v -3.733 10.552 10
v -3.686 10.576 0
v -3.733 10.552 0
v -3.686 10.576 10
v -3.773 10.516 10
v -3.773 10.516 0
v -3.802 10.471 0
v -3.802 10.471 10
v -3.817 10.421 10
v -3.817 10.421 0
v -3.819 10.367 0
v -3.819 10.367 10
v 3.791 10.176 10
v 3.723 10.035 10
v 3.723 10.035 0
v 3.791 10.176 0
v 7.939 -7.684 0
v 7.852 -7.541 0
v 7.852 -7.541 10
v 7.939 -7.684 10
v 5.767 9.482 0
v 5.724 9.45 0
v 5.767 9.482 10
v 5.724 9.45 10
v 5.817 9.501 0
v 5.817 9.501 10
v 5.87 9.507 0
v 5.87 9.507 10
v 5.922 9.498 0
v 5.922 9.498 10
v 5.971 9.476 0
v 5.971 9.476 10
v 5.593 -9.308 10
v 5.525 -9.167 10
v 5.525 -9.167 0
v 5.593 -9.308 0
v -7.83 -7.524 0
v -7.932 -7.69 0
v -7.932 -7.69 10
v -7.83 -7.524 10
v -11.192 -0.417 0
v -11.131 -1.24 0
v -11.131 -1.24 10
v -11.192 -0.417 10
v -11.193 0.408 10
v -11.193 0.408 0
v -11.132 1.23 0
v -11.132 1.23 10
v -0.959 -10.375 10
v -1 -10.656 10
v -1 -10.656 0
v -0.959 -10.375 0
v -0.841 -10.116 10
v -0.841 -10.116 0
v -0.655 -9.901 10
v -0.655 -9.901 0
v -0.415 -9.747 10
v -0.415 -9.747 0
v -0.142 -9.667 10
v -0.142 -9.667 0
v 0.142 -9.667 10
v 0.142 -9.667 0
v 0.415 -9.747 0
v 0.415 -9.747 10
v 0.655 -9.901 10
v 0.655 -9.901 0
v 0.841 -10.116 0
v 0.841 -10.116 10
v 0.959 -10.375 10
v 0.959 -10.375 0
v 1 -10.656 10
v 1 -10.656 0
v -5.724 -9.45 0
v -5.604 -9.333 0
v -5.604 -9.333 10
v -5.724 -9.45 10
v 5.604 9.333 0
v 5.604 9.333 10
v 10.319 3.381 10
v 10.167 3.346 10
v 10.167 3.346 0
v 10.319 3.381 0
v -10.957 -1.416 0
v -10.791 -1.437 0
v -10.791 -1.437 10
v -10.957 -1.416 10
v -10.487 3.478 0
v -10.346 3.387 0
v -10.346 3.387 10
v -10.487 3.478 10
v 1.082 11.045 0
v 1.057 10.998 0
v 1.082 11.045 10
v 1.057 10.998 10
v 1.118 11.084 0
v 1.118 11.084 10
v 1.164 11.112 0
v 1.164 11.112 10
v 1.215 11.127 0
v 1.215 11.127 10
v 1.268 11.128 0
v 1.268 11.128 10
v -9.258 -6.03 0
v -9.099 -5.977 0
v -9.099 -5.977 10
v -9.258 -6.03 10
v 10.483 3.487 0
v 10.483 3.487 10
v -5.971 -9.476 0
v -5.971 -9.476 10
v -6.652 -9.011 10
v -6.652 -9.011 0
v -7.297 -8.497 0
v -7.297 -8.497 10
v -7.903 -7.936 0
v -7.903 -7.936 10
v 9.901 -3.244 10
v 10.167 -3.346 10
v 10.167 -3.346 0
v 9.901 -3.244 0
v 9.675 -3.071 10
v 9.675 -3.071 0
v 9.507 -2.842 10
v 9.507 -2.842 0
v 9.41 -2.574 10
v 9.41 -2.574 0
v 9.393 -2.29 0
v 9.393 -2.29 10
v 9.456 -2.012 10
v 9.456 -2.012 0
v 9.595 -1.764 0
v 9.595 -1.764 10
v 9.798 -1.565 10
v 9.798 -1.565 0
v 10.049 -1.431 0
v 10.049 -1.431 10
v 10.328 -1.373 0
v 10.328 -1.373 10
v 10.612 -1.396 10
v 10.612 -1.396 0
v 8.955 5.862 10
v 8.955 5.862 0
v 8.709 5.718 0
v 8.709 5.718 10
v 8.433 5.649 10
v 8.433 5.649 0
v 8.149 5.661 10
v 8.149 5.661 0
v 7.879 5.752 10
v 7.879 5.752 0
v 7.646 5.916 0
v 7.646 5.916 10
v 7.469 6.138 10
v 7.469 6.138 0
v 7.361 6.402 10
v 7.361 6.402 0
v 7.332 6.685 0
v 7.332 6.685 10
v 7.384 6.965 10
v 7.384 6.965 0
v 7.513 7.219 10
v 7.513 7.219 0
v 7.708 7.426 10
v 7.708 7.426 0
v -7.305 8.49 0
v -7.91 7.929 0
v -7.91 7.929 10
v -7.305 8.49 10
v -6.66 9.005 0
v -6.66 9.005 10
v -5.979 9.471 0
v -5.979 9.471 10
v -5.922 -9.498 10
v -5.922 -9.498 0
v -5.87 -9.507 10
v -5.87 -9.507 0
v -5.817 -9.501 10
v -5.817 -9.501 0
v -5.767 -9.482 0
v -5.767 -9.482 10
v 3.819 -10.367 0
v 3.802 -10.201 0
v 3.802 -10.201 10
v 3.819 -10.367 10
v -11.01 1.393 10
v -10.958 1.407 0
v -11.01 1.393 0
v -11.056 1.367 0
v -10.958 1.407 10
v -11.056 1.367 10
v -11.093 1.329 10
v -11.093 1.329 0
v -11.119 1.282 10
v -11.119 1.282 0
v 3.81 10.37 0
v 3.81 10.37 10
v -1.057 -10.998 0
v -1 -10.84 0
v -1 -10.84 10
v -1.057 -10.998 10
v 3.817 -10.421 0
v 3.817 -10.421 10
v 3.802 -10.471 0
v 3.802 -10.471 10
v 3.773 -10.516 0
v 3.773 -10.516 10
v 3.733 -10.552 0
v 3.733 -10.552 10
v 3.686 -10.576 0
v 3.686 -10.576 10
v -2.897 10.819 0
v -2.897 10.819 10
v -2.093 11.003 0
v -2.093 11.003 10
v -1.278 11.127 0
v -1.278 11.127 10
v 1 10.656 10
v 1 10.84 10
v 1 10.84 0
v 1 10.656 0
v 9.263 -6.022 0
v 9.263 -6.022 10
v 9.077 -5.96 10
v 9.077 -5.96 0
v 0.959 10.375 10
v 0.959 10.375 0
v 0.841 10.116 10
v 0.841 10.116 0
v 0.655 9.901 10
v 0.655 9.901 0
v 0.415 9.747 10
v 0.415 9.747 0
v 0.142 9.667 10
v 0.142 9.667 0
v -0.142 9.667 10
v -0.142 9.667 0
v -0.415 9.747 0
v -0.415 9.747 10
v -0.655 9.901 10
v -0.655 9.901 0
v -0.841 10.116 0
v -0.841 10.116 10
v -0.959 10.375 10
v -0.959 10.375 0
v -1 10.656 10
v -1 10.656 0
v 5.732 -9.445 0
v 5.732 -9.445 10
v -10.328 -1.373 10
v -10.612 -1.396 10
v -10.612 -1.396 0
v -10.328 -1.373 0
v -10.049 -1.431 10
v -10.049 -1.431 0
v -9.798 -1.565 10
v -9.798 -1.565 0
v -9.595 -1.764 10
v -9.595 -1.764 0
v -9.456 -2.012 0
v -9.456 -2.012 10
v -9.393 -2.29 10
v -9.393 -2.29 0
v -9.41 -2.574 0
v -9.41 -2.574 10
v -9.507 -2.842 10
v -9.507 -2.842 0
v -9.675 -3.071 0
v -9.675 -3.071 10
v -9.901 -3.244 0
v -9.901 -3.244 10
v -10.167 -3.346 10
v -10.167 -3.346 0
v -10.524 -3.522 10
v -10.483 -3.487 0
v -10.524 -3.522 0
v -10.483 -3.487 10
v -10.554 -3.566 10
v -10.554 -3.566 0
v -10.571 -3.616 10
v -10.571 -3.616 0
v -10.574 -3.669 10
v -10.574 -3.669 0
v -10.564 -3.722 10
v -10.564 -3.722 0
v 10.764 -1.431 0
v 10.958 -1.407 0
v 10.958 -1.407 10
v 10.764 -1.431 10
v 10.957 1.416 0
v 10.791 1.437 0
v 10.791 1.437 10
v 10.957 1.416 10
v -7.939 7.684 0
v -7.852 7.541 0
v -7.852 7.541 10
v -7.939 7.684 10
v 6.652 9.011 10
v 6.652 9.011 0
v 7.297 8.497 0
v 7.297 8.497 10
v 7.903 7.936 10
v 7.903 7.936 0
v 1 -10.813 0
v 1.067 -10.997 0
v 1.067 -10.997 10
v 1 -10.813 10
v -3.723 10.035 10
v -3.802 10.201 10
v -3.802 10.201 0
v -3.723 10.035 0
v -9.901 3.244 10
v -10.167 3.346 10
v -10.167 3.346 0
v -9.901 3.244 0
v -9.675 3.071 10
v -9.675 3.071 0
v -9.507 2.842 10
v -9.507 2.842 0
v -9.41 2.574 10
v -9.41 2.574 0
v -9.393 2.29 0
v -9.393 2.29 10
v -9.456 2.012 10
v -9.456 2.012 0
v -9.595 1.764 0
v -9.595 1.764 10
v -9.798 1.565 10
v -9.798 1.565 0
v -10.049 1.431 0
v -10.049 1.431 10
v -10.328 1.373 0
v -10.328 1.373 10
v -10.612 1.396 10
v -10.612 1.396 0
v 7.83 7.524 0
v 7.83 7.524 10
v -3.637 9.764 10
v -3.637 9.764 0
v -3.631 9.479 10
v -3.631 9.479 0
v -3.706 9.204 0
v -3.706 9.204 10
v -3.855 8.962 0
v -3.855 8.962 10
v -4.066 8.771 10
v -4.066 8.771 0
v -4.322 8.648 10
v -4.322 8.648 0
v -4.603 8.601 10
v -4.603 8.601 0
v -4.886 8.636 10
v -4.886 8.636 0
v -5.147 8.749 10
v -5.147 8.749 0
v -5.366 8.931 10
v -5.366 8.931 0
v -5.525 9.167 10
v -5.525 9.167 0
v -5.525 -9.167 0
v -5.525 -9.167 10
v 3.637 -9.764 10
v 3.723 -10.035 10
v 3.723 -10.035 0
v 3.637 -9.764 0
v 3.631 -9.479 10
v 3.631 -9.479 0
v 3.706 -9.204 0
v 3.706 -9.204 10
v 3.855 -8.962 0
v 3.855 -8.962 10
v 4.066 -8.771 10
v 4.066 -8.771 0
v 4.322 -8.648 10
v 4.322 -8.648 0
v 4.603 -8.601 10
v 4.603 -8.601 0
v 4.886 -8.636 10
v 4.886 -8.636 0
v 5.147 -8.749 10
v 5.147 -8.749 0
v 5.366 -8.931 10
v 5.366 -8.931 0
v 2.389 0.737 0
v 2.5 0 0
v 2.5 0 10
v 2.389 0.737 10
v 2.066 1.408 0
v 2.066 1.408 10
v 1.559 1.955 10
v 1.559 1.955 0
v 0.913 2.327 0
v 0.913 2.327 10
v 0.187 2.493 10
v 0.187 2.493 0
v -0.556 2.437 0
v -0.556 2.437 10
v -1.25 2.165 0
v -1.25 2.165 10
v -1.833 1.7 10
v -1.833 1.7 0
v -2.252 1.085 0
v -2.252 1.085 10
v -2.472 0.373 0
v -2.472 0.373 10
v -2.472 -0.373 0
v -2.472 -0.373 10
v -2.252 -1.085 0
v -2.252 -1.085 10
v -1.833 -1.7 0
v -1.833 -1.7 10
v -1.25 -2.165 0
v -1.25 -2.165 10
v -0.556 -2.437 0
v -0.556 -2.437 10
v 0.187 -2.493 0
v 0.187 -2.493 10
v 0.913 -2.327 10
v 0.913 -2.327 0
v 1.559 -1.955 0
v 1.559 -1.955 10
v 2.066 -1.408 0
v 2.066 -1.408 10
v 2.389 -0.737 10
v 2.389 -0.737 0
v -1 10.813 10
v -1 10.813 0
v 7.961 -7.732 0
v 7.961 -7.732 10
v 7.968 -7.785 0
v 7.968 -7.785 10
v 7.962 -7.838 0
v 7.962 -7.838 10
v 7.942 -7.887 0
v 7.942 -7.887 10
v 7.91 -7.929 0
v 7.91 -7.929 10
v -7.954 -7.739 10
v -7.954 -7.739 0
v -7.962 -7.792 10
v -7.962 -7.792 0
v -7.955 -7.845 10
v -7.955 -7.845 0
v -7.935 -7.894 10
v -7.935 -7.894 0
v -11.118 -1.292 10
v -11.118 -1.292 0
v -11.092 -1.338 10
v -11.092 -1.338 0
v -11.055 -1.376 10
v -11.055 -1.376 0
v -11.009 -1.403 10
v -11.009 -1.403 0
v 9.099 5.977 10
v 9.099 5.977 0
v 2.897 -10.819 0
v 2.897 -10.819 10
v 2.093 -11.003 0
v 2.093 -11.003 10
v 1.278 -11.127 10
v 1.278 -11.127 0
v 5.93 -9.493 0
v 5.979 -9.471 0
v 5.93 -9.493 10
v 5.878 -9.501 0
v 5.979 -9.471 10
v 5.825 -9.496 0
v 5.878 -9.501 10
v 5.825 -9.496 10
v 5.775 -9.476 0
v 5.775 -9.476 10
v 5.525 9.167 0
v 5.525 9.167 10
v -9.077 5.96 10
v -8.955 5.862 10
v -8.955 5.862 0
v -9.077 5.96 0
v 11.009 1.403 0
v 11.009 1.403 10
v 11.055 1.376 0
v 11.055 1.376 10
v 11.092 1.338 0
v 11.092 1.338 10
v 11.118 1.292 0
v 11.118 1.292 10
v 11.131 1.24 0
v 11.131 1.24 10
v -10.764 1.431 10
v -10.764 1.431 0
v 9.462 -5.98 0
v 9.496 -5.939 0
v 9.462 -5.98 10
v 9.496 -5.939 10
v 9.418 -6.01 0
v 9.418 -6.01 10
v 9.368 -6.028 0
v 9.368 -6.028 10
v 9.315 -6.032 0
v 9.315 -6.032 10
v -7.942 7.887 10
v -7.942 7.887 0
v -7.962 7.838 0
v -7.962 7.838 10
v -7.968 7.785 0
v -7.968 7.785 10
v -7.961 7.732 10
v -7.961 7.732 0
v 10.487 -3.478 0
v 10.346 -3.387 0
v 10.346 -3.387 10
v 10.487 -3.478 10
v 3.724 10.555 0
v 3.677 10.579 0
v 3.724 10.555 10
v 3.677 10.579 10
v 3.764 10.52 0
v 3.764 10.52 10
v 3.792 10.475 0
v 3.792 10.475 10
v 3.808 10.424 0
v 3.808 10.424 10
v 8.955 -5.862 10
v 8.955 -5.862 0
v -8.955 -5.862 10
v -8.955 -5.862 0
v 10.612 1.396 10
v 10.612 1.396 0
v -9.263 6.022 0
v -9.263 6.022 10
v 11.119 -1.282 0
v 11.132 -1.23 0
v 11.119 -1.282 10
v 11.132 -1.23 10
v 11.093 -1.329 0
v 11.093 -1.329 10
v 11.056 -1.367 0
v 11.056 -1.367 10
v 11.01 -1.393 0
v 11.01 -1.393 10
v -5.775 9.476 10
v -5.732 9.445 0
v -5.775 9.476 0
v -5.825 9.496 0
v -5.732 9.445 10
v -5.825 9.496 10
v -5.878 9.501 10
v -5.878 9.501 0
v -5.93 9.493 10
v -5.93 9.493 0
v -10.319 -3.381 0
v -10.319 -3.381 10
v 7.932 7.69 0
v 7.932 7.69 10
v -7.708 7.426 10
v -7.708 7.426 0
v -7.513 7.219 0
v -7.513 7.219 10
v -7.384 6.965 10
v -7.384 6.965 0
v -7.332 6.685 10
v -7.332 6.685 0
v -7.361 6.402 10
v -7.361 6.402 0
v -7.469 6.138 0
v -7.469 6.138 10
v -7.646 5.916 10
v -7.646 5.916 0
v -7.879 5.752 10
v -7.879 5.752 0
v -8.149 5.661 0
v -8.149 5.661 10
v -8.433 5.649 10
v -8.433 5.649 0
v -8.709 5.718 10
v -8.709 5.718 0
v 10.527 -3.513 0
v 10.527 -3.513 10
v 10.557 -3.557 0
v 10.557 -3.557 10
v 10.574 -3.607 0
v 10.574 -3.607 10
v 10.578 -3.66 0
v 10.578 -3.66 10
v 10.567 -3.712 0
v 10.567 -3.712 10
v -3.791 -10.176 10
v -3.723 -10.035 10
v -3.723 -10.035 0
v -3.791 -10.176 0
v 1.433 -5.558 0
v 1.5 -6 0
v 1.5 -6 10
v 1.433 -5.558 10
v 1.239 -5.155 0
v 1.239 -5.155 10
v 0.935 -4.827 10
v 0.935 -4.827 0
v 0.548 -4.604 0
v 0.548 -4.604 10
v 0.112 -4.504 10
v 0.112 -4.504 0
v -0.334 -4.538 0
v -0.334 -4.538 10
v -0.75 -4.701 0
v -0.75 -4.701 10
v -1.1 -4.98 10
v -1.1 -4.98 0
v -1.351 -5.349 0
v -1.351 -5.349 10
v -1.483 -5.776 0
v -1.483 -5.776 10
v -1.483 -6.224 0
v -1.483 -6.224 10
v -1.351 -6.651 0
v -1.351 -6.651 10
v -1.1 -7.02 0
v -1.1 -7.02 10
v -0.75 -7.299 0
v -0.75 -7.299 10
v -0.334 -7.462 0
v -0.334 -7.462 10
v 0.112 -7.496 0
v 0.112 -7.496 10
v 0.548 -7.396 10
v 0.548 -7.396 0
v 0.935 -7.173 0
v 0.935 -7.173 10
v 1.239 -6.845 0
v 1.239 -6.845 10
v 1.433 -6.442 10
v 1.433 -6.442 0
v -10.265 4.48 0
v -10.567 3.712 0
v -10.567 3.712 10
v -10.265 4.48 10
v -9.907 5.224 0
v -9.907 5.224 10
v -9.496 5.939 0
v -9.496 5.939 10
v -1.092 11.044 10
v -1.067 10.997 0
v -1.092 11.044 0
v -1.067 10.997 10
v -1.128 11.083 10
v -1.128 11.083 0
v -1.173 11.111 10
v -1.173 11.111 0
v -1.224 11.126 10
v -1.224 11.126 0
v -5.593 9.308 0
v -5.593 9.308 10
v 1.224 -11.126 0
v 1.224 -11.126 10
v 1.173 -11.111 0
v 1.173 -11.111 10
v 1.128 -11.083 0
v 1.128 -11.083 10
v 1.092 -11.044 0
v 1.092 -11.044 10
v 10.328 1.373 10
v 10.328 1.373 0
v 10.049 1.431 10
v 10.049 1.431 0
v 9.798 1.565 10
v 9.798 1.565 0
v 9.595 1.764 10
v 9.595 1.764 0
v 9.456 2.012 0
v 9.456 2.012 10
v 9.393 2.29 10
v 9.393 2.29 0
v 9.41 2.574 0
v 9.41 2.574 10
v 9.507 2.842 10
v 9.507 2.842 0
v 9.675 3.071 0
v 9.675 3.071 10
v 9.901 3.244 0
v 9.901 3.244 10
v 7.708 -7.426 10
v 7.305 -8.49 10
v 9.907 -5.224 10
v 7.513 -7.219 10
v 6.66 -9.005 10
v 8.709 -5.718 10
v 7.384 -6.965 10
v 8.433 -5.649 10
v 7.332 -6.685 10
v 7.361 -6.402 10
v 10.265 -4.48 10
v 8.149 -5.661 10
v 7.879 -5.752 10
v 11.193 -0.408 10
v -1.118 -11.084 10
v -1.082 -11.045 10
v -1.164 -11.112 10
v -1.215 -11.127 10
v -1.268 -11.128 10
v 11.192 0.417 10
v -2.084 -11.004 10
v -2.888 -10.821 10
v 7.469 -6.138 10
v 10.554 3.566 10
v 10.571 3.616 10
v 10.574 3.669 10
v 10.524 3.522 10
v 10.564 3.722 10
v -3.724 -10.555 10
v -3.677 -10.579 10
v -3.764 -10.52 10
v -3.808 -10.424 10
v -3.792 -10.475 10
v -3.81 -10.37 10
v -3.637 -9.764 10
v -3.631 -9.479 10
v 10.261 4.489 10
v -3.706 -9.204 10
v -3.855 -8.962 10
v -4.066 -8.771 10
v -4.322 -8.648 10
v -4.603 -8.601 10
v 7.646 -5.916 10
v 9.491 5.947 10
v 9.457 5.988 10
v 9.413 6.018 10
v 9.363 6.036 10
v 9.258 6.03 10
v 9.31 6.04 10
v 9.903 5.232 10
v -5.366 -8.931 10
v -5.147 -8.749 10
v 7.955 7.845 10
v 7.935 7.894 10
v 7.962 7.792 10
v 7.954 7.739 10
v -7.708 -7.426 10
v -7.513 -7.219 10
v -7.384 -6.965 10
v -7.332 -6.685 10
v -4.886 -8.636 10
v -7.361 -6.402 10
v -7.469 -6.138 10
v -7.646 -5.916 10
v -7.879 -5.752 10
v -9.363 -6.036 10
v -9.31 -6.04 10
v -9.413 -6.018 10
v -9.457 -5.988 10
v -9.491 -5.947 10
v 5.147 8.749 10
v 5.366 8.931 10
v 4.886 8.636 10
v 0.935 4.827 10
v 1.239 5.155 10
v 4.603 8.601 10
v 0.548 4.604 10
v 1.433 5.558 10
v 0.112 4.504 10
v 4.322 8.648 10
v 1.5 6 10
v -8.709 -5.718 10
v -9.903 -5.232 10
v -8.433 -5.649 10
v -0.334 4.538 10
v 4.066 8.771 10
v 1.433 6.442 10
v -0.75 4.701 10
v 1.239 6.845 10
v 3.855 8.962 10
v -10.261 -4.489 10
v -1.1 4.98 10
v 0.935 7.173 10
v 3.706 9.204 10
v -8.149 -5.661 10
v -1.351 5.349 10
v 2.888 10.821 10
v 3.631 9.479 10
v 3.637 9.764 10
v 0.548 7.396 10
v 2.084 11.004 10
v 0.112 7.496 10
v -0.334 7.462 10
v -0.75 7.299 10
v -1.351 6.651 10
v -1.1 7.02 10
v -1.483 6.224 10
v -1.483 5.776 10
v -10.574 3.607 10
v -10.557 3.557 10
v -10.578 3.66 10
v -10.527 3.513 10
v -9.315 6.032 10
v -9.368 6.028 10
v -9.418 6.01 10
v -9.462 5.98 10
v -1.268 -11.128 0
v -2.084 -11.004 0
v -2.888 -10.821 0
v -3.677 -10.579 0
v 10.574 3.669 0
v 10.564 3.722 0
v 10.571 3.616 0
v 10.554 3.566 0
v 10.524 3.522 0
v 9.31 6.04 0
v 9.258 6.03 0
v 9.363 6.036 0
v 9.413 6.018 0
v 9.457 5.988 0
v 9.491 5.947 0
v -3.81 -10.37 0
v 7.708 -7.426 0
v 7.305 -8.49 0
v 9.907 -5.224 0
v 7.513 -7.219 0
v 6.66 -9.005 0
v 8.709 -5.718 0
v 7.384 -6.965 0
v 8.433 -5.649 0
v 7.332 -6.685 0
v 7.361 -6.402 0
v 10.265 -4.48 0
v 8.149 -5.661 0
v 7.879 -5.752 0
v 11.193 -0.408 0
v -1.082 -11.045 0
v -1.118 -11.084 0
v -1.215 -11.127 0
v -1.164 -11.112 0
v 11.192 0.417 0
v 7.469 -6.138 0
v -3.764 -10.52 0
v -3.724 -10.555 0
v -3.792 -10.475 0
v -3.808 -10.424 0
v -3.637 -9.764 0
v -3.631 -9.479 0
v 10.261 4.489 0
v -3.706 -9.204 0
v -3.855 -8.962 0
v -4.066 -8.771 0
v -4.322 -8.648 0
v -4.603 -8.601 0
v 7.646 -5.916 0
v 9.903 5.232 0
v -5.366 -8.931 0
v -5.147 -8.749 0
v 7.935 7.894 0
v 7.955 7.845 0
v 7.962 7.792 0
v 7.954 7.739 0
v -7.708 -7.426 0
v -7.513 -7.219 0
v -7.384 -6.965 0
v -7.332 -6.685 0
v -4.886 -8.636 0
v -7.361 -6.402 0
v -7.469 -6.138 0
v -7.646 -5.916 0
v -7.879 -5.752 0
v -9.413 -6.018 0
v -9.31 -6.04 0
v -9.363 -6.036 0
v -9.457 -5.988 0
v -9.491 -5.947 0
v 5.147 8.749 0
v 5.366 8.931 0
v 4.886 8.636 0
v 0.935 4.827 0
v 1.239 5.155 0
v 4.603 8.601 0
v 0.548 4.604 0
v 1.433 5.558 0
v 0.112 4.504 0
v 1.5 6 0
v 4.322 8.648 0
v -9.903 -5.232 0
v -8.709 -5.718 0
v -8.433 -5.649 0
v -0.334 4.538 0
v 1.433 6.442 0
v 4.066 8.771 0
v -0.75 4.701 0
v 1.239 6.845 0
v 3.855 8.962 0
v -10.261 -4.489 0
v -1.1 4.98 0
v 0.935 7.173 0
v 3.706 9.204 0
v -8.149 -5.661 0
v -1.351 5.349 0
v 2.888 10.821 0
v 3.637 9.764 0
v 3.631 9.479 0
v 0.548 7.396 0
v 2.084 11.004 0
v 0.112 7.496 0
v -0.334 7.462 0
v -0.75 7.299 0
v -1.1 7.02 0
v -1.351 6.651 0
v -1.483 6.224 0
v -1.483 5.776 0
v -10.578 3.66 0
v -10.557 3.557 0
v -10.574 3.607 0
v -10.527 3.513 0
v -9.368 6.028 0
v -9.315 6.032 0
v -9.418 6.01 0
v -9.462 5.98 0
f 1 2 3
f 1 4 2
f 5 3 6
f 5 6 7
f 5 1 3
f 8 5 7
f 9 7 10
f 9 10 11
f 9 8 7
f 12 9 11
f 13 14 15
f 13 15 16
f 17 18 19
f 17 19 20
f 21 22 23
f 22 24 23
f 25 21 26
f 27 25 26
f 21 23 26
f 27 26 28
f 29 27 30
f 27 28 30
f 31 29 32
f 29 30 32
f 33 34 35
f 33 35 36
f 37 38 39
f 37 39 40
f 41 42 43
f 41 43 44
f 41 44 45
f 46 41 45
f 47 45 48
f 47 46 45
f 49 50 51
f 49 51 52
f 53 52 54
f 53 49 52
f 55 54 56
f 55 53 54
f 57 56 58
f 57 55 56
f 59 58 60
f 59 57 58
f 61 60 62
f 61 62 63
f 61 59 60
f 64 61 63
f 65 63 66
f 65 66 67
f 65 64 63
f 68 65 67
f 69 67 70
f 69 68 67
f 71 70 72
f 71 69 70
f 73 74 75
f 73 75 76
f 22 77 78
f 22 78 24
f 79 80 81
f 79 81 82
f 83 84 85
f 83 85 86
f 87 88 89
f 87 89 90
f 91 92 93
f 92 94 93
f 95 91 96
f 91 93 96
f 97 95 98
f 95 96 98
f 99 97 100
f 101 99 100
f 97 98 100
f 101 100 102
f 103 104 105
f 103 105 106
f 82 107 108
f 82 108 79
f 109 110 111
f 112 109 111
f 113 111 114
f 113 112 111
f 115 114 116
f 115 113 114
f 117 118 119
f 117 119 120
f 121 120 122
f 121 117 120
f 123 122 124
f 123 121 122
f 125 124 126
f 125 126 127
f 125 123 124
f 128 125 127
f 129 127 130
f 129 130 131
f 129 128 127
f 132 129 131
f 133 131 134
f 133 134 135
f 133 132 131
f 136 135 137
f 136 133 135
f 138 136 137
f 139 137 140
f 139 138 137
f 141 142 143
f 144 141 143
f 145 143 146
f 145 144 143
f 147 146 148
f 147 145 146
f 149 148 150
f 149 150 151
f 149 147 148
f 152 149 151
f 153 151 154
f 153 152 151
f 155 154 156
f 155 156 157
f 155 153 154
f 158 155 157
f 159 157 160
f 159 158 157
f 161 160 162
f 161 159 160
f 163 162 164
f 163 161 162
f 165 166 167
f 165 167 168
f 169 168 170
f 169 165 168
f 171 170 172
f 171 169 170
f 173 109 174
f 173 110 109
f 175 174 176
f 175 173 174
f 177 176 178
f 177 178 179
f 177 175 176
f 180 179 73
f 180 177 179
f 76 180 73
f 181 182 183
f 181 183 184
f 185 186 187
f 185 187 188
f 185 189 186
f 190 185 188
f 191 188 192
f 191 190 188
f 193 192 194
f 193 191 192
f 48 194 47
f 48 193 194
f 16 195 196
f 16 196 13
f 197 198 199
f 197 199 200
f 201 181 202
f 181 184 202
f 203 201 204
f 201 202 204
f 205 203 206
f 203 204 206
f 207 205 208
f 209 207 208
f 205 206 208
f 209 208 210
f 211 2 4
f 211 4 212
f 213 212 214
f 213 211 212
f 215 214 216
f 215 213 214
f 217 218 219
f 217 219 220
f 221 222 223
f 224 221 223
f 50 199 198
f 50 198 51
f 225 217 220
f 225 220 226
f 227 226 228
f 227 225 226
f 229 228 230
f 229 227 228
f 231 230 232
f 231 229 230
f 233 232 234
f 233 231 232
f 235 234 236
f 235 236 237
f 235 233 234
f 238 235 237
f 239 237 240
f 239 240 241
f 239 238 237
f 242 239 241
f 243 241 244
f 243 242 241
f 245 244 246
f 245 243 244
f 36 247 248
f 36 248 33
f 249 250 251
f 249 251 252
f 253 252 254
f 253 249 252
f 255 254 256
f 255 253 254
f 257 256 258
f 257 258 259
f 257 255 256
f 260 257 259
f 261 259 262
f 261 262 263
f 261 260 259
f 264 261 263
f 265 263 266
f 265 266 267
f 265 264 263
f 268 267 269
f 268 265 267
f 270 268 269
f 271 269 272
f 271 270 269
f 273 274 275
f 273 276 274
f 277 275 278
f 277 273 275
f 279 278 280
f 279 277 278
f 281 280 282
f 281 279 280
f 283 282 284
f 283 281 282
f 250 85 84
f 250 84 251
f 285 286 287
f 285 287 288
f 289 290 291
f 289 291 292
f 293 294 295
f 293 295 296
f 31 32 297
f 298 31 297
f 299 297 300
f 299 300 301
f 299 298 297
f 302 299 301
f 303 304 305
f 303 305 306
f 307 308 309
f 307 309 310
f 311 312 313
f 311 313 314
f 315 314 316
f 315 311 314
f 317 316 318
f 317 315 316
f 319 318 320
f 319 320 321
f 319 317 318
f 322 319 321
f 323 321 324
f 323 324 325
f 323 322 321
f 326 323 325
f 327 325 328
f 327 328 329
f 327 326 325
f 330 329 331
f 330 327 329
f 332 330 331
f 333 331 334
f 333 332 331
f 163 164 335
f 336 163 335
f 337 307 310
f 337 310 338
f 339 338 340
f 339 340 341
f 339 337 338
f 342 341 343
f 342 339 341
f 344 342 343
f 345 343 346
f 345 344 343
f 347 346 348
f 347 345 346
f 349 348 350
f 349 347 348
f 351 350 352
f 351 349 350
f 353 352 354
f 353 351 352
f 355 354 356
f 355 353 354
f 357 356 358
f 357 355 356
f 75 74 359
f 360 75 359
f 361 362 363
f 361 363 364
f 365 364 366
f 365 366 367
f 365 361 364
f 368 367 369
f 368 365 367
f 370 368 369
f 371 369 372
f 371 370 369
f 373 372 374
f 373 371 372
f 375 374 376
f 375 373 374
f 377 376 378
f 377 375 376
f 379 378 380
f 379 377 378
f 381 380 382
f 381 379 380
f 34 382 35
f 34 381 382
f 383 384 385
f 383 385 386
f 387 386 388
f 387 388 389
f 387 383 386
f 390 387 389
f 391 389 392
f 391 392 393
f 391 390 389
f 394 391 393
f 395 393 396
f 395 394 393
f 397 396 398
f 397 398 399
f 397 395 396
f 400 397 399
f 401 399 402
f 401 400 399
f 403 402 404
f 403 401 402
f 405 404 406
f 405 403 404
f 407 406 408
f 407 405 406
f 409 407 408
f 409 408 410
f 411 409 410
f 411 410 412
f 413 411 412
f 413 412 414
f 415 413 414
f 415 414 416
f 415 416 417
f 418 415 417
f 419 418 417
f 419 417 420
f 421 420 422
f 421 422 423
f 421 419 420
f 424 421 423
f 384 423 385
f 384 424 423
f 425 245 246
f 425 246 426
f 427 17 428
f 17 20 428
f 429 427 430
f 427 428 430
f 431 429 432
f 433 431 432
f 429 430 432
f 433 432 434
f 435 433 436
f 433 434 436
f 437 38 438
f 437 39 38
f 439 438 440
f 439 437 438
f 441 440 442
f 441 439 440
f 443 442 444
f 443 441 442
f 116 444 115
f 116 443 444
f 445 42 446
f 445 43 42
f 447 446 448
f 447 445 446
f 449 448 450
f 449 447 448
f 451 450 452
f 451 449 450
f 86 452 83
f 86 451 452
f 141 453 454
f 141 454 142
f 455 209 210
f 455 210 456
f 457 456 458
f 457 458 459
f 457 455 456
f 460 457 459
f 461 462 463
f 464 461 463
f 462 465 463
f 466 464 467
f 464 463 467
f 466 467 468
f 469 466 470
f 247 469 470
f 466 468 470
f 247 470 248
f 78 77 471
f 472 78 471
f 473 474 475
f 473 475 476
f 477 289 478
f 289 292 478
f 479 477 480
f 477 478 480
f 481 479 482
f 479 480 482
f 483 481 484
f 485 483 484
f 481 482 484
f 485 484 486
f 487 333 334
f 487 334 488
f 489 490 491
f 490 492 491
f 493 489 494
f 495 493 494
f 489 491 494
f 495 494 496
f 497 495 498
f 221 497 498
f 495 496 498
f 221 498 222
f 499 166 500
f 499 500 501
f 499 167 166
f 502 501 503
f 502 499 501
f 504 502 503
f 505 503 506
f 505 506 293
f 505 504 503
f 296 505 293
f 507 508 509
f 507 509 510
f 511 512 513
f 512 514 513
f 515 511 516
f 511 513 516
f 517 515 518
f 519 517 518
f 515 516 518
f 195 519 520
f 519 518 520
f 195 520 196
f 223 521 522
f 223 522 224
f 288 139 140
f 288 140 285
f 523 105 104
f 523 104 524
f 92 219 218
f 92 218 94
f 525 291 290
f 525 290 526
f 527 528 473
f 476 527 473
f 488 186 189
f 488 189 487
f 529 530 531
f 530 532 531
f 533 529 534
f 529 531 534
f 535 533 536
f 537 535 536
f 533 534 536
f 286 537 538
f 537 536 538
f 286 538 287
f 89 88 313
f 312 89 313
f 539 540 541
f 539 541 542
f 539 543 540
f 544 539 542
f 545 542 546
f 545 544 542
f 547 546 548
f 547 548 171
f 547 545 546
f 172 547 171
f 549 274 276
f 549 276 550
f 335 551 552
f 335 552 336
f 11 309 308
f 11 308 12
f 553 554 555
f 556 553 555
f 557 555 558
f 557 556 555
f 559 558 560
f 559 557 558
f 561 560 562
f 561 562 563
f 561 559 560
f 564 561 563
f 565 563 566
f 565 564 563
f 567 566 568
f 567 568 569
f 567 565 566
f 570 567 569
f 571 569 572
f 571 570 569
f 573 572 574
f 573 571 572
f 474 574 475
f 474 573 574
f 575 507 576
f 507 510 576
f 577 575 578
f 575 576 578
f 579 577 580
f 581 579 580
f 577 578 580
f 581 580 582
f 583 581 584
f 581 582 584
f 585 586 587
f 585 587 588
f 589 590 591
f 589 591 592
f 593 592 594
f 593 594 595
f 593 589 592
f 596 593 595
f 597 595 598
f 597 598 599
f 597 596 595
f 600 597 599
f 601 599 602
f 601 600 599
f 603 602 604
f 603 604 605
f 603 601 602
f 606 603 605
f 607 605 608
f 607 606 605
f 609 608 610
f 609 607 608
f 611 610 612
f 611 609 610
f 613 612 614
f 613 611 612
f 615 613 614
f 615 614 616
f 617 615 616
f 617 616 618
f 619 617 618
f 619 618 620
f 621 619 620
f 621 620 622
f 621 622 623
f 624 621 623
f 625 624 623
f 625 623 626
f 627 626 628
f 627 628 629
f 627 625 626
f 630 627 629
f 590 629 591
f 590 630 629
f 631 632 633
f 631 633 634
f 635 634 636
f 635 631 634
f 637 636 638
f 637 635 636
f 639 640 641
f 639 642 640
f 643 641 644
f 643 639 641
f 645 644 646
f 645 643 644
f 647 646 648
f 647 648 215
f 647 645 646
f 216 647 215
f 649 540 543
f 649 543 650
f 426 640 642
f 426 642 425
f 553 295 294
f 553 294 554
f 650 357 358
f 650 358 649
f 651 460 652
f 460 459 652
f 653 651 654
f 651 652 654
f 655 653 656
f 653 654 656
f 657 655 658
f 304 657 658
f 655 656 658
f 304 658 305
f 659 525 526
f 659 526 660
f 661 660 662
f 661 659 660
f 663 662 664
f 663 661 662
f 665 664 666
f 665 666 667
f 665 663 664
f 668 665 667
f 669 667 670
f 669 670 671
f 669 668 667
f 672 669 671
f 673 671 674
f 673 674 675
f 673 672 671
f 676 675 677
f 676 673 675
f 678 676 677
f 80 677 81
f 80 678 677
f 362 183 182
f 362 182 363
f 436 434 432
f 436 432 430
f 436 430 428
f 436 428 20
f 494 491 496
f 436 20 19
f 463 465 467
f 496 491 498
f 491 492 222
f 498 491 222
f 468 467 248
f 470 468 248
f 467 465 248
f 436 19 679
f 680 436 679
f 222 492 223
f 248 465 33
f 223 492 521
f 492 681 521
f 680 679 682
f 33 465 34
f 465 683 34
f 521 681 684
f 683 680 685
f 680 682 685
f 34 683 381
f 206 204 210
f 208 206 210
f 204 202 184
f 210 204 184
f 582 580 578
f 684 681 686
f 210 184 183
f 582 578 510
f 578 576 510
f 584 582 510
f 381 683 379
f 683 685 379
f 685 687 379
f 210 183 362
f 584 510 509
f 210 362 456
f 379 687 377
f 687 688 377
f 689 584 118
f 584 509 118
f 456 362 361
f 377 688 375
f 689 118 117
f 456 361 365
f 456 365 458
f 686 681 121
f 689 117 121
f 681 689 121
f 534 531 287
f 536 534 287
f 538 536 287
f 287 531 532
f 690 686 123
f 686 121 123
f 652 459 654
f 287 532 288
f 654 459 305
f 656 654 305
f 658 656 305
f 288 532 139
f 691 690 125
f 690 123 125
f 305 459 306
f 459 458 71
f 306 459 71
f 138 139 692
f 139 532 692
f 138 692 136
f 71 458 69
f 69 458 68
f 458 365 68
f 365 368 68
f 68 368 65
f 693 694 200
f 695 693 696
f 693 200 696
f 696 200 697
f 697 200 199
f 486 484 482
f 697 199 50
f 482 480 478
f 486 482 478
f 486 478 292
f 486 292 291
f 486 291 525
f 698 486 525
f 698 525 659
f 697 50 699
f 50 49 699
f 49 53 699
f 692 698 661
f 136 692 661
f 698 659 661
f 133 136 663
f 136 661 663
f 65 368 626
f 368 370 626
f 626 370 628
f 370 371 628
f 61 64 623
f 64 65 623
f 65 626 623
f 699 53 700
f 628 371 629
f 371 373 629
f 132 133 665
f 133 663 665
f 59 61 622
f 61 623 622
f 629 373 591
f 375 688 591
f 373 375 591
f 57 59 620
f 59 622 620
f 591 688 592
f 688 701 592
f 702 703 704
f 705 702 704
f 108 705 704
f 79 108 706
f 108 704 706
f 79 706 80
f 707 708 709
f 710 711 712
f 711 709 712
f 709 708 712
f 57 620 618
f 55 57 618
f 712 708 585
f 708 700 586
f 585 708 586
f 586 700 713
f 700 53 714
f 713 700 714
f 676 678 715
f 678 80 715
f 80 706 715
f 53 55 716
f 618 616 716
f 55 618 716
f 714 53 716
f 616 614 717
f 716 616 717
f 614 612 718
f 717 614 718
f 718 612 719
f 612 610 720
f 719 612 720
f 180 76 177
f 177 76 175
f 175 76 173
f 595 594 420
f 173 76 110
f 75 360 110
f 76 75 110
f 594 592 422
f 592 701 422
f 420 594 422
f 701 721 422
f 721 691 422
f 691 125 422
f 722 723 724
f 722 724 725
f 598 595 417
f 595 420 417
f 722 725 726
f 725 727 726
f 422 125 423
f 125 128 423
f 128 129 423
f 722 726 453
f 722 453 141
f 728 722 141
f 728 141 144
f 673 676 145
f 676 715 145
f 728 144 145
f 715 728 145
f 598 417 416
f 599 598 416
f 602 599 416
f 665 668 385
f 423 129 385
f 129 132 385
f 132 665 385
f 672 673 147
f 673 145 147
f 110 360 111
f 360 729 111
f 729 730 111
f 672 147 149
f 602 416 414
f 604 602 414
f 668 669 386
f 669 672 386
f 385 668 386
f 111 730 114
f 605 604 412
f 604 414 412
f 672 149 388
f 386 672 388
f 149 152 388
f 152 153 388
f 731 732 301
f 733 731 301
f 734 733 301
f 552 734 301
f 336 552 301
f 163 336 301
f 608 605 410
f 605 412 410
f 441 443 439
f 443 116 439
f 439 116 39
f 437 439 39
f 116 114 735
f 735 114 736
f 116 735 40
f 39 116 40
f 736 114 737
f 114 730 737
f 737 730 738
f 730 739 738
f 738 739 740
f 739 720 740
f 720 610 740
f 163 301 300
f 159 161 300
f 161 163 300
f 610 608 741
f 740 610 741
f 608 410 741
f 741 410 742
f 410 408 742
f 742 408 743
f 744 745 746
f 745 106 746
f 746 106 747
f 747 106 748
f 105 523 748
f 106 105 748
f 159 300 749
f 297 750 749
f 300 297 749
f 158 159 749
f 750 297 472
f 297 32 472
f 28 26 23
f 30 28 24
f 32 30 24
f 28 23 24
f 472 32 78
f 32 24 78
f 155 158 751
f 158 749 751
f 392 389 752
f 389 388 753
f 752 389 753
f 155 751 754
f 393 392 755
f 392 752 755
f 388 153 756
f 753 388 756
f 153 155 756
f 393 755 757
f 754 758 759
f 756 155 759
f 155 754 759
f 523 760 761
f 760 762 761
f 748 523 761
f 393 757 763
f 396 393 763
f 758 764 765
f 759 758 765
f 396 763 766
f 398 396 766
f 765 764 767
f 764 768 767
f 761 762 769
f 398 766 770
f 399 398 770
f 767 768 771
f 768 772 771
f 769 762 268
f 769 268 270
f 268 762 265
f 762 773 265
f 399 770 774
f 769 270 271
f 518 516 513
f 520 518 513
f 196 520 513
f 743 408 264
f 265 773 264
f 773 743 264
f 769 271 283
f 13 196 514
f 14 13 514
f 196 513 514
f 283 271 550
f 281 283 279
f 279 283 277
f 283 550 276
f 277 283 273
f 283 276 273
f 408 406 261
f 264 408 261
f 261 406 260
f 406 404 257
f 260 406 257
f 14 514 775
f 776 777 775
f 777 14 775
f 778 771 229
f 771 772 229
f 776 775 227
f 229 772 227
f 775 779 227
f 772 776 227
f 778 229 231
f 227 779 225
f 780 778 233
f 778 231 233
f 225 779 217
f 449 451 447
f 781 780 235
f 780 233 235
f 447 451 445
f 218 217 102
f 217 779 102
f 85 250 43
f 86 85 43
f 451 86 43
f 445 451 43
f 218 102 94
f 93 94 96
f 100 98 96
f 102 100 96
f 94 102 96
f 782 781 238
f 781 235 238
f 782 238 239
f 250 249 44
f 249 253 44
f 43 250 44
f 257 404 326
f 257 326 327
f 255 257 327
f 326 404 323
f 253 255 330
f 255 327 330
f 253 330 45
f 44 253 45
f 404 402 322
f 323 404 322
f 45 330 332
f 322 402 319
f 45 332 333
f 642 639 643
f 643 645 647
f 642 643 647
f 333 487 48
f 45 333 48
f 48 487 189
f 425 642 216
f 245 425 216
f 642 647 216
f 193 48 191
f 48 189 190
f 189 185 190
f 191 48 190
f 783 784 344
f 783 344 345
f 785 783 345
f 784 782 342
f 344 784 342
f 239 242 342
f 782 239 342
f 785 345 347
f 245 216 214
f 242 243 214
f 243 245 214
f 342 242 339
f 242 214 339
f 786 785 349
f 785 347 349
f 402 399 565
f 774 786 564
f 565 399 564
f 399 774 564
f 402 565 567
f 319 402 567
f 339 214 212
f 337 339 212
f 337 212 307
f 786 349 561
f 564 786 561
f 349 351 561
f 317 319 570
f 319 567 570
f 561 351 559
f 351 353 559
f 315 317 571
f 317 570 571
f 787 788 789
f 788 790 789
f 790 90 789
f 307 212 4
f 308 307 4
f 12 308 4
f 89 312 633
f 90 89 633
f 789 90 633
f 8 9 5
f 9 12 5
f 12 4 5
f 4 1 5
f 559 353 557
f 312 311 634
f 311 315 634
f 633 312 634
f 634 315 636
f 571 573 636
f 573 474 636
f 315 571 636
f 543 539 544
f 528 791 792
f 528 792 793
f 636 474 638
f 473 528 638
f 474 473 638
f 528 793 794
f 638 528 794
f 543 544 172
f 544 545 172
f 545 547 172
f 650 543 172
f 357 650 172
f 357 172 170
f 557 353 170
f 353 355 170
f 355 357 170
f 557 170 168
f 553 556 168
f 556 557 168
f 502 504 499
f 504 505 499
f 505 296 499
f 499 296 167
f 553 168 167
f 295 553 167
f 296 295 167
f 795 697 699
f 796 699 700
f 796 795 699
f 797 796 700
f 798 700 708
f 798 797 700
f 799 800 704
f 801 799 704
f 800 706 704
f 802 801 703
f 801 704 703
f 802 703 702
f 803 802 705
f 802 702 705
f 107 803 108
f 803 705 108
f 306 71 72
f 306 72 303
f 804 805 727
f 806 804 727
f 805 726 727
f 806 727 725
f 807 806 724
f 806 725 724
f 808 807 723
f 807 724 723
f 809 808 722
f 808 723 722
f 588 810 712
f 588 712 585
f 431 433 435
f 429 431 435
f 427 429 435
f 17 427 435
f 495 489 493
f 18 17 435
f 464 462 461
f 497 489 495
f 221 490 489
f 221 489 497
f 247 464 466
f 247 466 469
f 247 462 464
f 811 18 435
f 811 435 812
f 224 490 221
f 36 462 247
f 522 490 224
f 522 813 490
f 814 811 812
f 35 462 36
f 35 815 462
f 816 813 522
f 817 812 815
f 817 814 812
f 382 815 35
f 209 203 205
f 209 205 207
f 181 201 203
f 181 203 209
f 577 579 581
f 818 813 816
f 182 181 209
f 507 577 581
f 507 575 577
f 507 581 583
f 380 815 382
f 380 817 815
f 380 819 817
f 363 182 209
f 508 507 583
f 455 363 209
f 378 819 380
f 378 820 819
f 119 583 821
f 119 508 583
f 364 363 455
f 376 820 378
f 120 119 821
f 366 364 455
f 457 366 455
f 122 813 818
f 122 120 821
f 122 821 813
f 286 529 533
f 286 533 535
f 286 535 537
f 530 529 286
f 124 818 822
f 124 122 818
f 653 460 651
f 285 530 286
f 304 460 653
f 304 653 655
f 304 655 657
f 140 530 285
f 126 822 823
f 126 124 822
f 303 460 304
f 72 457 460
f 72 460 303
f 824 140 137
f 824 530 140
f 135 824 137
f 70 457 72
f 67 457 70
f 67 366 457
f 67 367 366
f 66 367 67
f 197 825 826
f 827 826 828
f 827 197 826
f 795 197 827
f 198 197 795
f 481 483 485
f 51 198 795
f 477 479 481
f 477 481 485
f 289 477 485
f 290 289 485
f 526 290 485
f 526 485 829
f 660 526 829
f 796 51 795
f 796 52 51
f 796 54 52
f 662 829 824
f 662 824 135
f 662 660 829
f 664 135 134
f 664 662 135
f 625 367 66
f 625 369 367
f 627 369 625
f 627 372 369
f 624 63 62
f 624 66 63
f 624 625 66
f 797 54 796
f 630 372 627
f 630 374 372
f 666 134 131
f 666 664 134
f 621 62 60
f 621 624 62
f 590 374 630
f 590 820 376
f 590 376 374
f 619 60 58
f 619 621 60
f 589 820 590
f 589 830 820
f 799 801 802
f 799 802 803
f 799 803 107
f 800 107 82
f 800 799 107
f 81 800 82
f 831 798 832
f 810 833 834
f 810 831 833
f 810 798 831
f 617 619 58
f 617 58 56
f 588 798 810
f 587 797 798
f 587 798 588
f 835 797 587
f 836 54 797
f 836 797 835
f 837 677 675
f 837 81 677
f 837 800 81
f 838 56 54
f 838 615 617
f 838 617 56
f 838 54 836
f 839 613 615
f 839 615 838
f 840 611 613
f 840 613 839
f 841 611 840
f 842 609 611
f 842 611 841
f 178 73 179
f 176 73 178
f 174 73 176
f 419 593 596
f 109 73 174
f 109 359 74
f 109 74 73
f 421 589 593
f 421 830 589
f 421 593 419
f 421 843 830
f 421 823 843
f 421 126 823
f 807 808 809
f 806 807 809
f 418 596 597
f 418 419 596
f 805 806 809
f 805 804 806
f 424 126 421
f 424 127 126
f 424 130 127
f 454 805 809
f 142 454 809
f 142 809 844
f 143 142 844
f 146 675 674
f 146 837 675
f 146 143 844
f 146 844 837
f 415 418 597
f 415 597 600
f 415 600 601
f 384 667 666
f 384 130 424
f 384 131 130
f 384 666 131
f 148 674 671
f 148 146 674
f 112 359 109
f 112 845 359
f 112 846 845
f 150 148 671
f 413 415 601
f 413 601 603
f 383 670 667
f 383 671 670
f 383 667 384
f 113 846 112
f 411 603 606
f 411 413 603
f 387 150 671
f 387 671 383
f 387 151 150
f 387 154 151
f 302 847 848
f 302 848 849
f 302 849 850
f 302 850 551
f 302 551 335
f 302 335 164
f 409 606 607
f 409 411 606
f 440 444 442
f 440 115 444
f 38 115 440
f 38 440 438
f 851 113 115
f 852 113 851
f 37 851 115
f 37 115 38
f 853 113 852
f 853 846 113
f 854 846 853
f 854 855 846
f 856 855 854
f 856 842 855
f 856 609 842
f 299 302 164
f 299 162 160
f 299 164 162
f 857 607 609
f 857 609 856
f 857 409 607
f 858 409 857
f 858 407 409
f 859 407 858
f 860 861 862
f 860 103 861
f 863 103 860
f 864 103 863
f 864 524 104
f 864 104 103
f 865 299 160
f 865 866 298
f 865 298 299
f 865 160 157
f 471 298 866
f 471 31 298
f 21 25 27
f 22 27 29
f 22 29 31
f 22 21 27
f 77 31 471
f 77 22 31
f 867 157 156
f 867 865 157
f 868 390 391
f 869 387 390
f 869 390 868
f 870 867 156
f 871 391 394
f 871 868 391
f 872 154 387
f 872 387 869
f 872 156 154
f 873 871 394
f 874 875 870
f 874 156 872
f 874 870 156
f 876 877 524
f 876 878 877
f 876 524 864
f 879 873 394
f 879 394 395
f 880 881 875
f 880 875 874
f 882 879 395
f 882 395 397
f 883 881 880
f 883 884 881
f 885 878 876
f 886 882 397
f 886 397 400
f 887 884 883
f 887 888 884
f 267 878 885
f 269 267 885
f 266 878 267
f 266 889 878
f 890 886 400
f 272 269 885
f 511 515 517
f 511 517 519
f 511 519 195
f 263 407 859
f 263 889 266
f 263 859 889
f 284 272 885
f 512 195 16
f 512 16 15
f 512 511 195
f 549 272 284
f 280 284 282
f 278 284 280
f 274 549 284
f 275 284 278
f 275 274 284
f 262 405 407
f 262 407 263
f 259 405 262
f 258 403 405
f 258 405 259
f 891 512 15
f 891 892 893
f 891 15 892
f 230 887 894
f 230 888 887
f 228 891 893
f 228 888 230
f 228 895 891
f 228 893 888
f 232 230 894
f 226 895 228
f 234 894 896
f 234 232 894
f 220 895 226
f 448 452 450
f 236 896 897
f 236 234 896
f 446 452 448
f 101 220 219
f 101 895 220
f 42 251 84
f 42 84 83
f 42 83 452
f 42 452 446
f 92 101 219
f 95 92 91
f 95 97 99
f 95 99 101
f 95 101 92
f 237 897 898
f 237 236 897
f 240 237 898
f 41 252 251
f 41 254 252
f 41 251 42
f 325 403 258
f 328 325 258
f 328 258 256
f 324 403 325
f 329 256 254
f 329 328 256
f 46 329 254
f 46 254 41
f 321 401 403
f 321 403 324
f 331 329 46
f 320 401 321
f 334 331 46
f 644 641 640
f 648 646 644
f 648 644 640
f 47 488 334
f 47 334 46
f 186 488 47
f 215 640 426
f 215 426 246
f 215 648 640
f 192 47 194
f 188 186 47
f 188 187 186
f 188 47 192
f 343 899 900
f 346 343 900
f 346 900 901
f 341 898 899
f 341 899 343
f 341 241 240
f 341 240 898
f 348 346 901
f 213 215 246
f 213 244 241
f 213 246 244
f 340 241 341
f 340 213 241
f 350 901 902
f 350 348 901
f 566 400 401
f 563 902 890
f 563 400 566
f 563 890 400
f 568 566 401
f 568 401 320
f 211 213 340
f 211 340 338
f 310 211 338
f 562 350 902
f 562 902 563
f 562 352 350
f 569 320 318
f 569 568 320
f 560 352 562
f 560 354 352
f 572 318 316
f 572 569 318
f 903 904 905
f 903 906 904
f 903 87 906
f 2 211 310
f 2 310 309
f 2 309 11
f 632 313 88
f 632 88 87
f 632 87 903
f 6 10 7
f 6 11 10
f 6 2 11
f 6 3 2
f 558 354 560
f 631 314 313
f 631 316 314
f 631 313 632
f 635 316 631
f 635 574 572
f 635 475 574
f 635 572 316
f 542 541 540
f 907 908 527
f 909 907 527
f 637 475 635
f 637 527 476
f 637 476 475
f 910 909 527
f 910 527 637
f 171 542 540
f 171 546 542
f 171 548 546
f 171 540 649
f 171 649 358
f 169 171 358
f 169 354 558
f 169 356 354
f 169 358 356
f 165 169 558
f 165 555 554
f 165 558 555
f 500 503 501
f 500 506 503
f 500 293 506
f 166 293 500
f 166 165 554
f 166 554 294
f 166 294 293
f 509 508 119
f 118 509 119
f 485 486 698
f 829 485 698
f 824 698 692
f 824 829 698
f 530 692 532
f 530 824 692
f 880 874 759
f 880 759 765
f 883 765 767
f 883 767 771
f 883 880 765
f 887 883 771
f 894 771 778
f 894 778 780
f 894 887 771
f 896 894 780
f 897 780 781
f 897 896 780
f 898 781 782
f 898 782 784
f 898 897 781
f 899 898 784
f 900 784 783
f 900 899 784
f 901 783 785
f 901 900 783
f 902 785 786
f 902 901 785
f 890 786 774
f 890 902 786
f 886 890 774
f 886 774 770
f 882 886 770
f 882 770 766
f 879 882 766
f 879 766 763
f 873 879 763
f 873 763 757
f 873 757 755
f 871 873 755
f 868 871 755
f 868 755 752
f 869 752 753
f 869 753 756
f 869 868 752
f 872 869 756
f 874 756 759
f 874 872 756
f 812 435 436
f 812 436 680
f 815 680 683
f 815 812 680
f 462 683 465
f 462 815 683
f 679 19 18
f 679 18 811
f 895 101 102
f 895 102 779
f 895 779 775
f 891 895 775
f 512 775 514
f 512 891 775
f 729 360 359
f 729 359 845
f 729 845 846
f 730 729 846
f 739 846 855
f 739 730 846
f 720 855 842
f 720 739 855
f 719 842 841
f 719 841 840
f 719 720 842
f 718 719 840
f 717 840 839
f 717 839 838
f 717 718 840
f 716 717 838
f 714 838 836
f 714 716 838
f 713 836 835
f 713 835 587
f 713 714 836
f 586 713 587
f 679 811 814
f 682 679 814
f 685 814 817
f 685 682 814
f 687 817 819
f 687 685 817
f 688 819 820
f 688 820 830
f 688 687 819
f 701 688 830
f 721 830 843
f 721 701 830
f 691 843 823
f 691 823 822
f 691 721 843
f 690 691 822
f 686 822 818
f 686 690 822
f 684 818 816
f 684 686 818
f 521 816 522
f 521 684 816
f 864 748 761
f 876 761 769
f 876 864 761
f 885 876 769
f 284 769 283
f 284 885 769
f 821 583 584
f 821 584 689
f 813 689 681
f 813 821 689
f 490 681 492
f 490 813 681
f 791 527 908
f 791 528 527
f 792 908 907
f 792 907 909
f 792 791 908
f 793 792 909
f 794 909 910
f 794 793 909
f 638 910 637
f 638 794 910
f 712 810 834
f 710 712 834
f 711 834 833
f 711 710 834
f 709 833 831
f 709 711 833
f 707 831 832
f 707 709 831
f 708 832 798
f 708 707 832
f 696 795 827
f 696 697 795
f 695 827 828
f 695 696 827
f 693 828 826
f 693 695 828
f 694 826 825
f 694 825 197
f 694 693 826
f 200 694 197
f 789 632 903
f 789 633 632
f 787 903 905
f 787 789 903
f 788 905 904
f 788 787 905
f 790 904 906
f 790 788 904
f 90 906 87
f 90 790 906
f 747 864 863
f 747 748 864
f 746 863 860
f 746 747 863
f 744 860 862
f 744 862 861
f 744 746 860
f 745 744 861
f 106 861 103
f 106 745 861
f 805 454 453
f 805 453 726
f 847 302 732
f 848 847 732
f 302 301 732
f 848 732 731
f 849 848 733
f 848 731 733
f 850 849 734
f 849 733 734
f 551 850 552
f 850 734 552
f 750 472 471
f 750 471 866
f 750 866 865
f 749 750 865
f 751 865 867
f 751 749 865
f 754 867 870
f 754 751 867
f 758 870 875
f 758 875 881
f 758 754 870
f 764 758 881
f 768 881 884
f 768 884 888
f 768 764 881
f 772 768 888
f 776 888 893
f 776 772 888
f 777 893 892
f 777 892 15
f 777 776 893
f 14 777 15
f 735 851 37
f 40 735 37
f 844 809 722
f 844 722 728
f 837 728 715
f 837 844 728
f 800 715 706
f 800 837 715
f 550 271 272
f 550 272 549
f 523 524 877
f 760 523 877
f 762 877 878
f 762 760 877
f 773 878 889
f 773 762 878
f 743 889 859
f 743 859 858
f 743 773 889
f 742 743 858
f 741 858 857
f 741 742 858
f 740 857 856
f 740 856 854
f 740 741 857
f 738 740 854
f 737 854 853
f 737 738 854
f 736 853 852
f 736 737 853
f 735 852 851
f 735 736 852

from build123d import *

# Parameters (mm, degrees)
SKETCH_1_R          = 2.5
SKETCH_1_R_2        = 1.5
EXTRUDE_1_DEPTH     = 10
FILLET_1_R          = 0.2
CUT_EXTRUDE_1_DEPTH = 10


with BuildPart() as part:
    # Эскиз1 → Вытянуть1 (new body)
    with BuildSketch(Plane.XY):
        with BuildLine():
            Line((-0.685932761, 9.95), (0, 9.95))
            Line((0, 9.95), (0.676, 9.95))
            Line((0.676, 9.95), (1.110862137, 11.144773901))
            ThreePointArc((1.110862137, 11.144773901), (2.487539236, 10.920263209), (3.825633205, 10.526373097))
            Line((3.825633205, 10.526373097), (3.699139141, 9.262255307))
            Line((3.699139141, 9.262255307), (4.317143204, 8.964640236))
            Line((4.317143204, 8.964640236), (4.926198159, 8.671334828))
            Line((4.926198159, 8.671334828), (5.836388374, 9.559109307))
            ThreePointArc((5.836388374, 9.559109307), (6.979320043, 8.759514355), (8.013998536, 7.824054413))
            Line((8.013998536, 7.824054413), (7.351551169, 6.740007356))
            Line((7.351551169, 6.740007356), (7.779223251, 6.203723528))
            Line((7.779223251, 6.203723528), (8.200702357, 5.675205446))
            Line((8.200702357, 5.675205446), (9.405946315, 6.08014588))
            ThreePointArc((9.405946315, 6.08014588), (10.088760919, 4.863836255), (10.615093172, 3.572085797))
            Line((10.615093172, 3.572085797), (9.547898328, 2.882818288))
            Line((9.547898328, 2.882818288), (9.700532726, 2.214083293))
            Line((9.700532726, 2.214083293), (9.850956878, 1.555032024))
            Line((9.850956878, 1.555032024), (11.112541232, 1.396934994))
            ThreePointArc((11.112541232, 1.396934994), (11.199998965, 0.004815734), (11.11373842, -1.38737822))
            Line((11.11373842, -1.38737822), (9.853167125, -1.545348298))
            Line((9.853167125, -1.545348298), (9.700532726, -2.214083293))
            Line((9.700532726, -2.214083293), (9.550108575, -2.873134562))
            Line((9.550108575, -2.873134562), (10.618161071, -3.562956001))
            ThreePointArc((10.618161071, -3.562956001), (10.092939856, -4.855158602), (9.411171473, -6.072054966))
            Line((9.411171473, -6.072054966), (8.206895332, -5.667439701))
            Line((8.206895332, -5.667439701), (7.779223251, -6.203723528))
            Line((7.779223251, -6.203723528), (7.357744145, -6.732241611))
            Line((7.357744145, -6.732241611), (8.020723888, -7.817159863))
            ThreePointArc((8.020723888, -7.817159863), (6.986850228, -8.753509233), (5.844606595, -9.554086756))
            Line((5.844606595, -9.554086756), (4.935147268, -8.667025164))
            Line((4.935147268, -8.667025164), (4.317143204, -8.964640236))
            Line((4.317143204, -8.964640236), (3.70808825, -9.257945643))
            Line((3.70808825, -9.257945643), (3.83468397, -10.523079343))
            ThreePointArc((3.83468397, -10.523079343), (2.496929223, -10.918120005), (1.120445701, -11.143814492))
            Line((1.120445701, -11.143814492), (0.685932761, -9.95))
            Line((0.685932761, -9.95), (0, -9.95))
            Line((0, -9.95), (-0.676, -9.95))
            Line((-0.676, -9.95), (-1.110862137, -11.144773901))
            ThreePointArc((-1.110862137, -11.144773901), (-2.487539236, -10.920263209), (-3.825633205, -10.526373097))
            Line((-3.825633205, -10.526373097), (-3.699139141, -9.262255307))
            Line((-3.699139141, -9.262255307), (-4.317143204, -8.964640236))
            Line((-4.317143204, -8.964640236), (-4.926198159, -8.671334828))
            Line((-4.926198159, -8.671334828), (-5.836388374, -9.559109307))
            ThreePointArc((-5.836388374, -9.559109307), (-6.979320043, -8.759514355), (-8.013998536, -7.824054413))
            Line((-8.013998536, -7.824054413), (-7.351551169, -6.740007356))
            Line((-7.351551169, -6.740007356), (-7.779223251, -6.203723528))
            Line((-7.779223251, -6.203723528), (-8.200702357, -5.675205446))
            Line((-8.200702357, -5.675205446), (-9.405946315, -6.08014588))
            ThreePointArc((-9.405946315, -6.08014588), (-10.088760919, -4.863836255), (-10.615093172, -3.572085797))
            Line((-10.615093172, -3.572085797), (-9.547898328, -2.882818288))
            Line((-9.547898328, -2.882818288), (-9.700532726, -2.214083293))
            Line((-9.700532726, -2.214083293), (-9.850956878, -1.555032024))
            Line((-9.850956878, -1.555032024), (-11.112541232, -1.396934994))
            ThreePointArc((-11.112541232, -1.396934994), (-11.199998965, -0.004815734), (-11.11373842, 1.38737822))
            Line((-11.11373842, 1.38737822), (-9.853167125, 1.545348298))
            Line((-9.853167125, 1.545348298), (-9.700532726, 2.214083293))
            Line((-9.700532726, 2.214083293), (-9.550108575, 2.873134562))
            Line((-9.550108575, 2.873134562), (-10.618161071, 3.562956001))
            ThreePointArc((-10.618161071, 3.562956001), (-10.092939856, 4.855158602), (-9.411171473, 6.072054966))
            Line((-9.411171473, 6.072054966), (-8.206895332, 5.667439701))
            Line((-8.206895332, 5.667439701), (-7.779223251, 6.203723528))
            Line((-7.779223251, 6.203723528), (-7.357744145, 6.732241611))
            Line((-7.357744145, 6.732241611), (-8.020723888, 7.817159863))
            ThreePointArc((-8.020723888, 7.817159863), (-6.986850228, 8.753509233), (-5.844606595, 9.554086756))
            Line((-5.844606595, 9.554086756), (-4.935147268, 8.667025164))
            Line((-4.935147268, 8.667025164), (-4.317143204, 8.964640236))
            Line((-4.317143204, 8.964640236), (-3.70808825, 9.257945643))
            Line((-3.70808825, 9.257945643), (-3.83468397, 10.523079343))
            ThreePointArc((-3.83468397, 10.523079343), (-2.496929223, 10.918120005), (-1.120445701, 11.143814492))
            Line((-1.120445701, 11.143814492), (-0.685932761, 9.95))
        make_face()
        Circle(SKETCH_1_R, mode=Mode.SUBTRACT)
        with Locations((0, 6)):
            Circle(SKETCH_1_R_2, mode=Mode.SUBTRACT)
        with Locations((0, -6)):
            Circle(SKETCH_1_R_2, mode=Mode.SUBTRACT)
    extrude(amount=EXTRUDE_1_DEPTH)

    # Скругление1
    fillet_1_edges = [part.edges().sort_by_distance(p)[0] for p in [
        (9.547898328, 2.882818288, 5),
        (9.850956878, 1.555032024, 5),
        (11.112541232, 1.396934994, 5),
        (11.11373842, -1.38737822, 5),
        (9.853167125, -1.545348298, 5),
        (9.550108575, -2.873134562, 5),
        (10.618161071, -3.562956001, 5),
        (9.411171473, -6.072054966, 5),
        (8.206895332, -5.667439701, 5),
        (7.357744145, -6.732241611, 5),
        (8.020723888, -7.817159863, 5),
        (5.844606595, -9.554086756, 5),
        (4.935147268, -8.667025164, 5),
        (3.70808825, -9.257945643, 5),
        (3.83468397, -10.523079343, 5),
        (1.120445701, -11.143814492, 5),
        (0.685932761, -9.95, 5),
        (-0.676, -9.95, 5),
        (-1.110862137, -11.144773901, 5),
        (-3.825633205, -10.526373097, 5),
        (-3.699139141, -9.262255307, 5),
        (-4.926198159, -8.671334828, 5),
        (-5.836388374, -9.559109307, 5),
        (-8.013998536, -7.824054413, 5),
        (-7.351551169, -6.740007356, 5),
        (-8.200702357, -5.675205446, 5),
        (-9.405946315, -6.08014588, 5),
        (-10.615093172, -3.572085797, 5),
        (-9.547898328, -2.882818288, 5),
        (-9.850956878, -1.555032024, 5),
        (-11.112541232, -1.396934994, 5),
        (-11.11373842, 1.38737822, 5),
        (-9.853167125, 1.545348298, 5),
        (-10.618161071, 3.562956001, 5),
        (-9.411171473, 6.072054966, 5),
        (-8.206895332, 5.667439701, 5),
        (-7.357744145, 6.732241611, 5),
        (-8.020723888, 7.817159863, 5),
        (-5.844606595, 9.554086756, 5),
        (-4.935147268, 8.667025164, 5),
        (-3.70808825, 9.257945643, 5),
        (-3.83468397, 10.523079343, 5),
        (-1.120445701, 11.143814492, 5),
        (-0.685932761, 9.95, 5),
        (0.676, 9.95, 5),
        (1.110862137, 11.144773901, 5),
        (3.825633205, 10.526373097, 5),
        (3.699139141, 9.262255307, 5),
        (4.926198159, 8.671334828, 5),
        (5.836388374, 9.559109307, 5),
        (8.013998536, 7.824054413, 5),
        (7.351551169, 6.740007356, 5),
        (8.200702357, 5.675205446, 5),
        (9.405946315, 6.08014588, 5),
        (10.615093172, 3.572085797, 5),
    ]]
    fillet(fillet_1_edges, radius=FILLET_1_R)

    # Эскиз2 → Вырез-Вытянуть1 (cut)
    with BuildSketch(Plane.XY.offset(10)):
        with BuildLine():
            Line((4.740104239, 12.147692744), (6.542041974, 11.279925266))
            Line((6.542041974, 11.279925266), (5.524607217, 9.167200224))
            ThreePointArc((5.524607217, 9.167200224), (4.18975461, 8.700115095), (3.722669482, 10.034967702))
            Line((3.722669482, 10.034967702), (4.740104239, 12.147692744))
        make_face()
        with BuildLine():
            Line((-1, 13.00134713), (1, 13.00134713))
            Line((1, 13.00134713), (1, 10.656399244))
            ThreePointArc((1, 10.656399244), (0, 9.656399244), (-1, 10.656399244))
            Line((-1, 10.656399244), (-1, 13.00134713))
        make_face()
        with BuildLine():
            Line((9.541372699, 8.888038829), (10.788352303, 7.324375864))
            Line((10.788352303, 7.324375864), (8.95499822, 5.862324771))
            ThreePointArc((8.95499822, 5.862324771), (7.549676936, 6.020666451), (7.708018617, 7.425987736))
            Line((7.708018617, 7.425987736), (9.541372699, 8.888038829))
        make_face()
        with BuildLine():
            Line((12.45285528, 3.867999818), (12.897897147, 1.918143994))
            Line((12.897897147, 1.918143994), (10.611742, 1.396344))
            ThreePointArc((10.611742, 1.396344), (9.414293154, 2.148750978), (10.166700132, 3.346199825))
            Line((10.166700132, 3.346199825), (12.45285528, 3.867999818))
        make_face()
        with BuildLine():
            Line((12.897897147, -1.918143994), (12.45285528, -3.867999818))
            Line((12.45285528, -3.867999818), (10.166700132, -3.346199825))
            ThreePointArc((10.166700132, -3.346199825), (9.414293154, -2.148750978), (10.611742, -1.396344))
            Line((10.611742, -1.396344), (12.897897147, -1.918143994))
        make_face()
        with BuildLine():
            Line((10.788352303, -7.324375864), (9.541372699, -8.888038829))
            Line((9.541372699, -8.888038829), (7.708018617, -7.425987736))
            ThreePointArc((7.708018617, -7.425987736), (7.549676936, -6.020666451), (8.95499822, -5.862324771))
            Line((8.95499822, -5.862324771), (10.788352303, -7.324375864))
        make_face()
        with BuildLine():
            Line((6.542041974, -11.279925266), (4.740104239, -12.147692744))
            Line((4.740104239, -12.147692744), (3.722669482, -10.034967702))
            ThreePointArc((3.722669482, -10.034967702), (4.18975461, -8.700115095), (5.524607217, -9.167200224))
            Line((5.524607217, -9.167200224), (6.542041974, -11.279925266))
        make_face()
        with BuildLine():
            Line((1, -13.00134713), (-1, -13.00134713))
            Line((-1, -13.00134713), (-1, -10.656399244))
            ThreePointArc((-1, -10.656399244), (0, -9.656399244), (1, -10.656399244))
            Line((1, -10.656399244), (1, -13.00134713))
        make_face()
        with BuildLine():
            Line((-4.740104239, -12.147692744), (-6.542041974, -11.279925266))
            Line((-6.542041974, -11.279925266), (-5.524607217, -9.167200224))
            ThreePointArc((-5.524607217, -9.167200224), (-4.18975461, -8.700115095), (-3.722669482, -10.034967702))
            Line((-3.722669482, -10.034967702), (-4.740104239, -12.147692744))
        make_face()
        with BuildLine():
            Line((-9.541372699, -8.888038829), (-10.788352303, -7.324375864))
            Line((-10.788352303, -7.324375864), (-8.95499822, -5.862324771))
            ThreePointArc((-8.95499822, -5.862324771), (-7.549676936, -6.020666451), (-7.708018617, -7.425987736))
            Line((-7.708018617, -7.425987736), (-9.541372699, -8.888038829))
        make_face()
        with BuildLine():
            Line((-12.452855279, -3.867999818), (-12.897897147, -1.918143994))
            Line((-12.897897147, -1.918143994), (-10.611742, -1.396344))
            ThreePointArc((-10.611742, -1.396344), (-9.414293154, -2.148750978), (-10.166700132, -3.346199825))
            Line((-10.166700132, -3.346199825), (-12.452855279, -3.867999818))
        make_face()
        with BuildLine():
            Line((-12.897897147, 1.918143994), (-12.45285528, 3.867999818))
            Line((-12.45285528, 3.867999818), (-10.166700132, 3.346199825))
            ThreePointArc((-10.166700132, 3.346199825), (-9.414293154, 2.148750978), (-10.611742, 1.396344))
            Line((-10.611742, 1.396344), (-12.897897147, 1.918143994))
        make_face()
        with BuildLine():
            Line((-10.788352303, 7.324375864), (-9.541372699, 8.888038829))
            Line((-9.541372699, 8.888038829), (-7.708018617, 7.425987736))
            ThreePointArc((-7.708018617, 7.425987736), (-7.549676936, 6.020666451), (-8.95499822, 5.862324771))
            Line((-8.95499822, 5.862324771), (-10.788352303, 7.324375864))
        make_face()
        with BuildLine():
            Line((-6.542041974, 11.279925266), (-4.740104239, 12.147692744))
            Line((-4.740104239, 12.147692744), (-3.722669482, 10.034967702))
            ThreePointArc((-3.722669482, 10.034967702), (-4.18975461, 8.700115095), (-5.524607217, 9.167200224))
            Line((-5.524607217, 9.167200224), (-6.542041974, 11.279925266))
        make_face()
    extrude(amount=-CUT_EXTRUDE_1_DEPTH, mode=Mode.SUBTRACT)


solid = part.part
